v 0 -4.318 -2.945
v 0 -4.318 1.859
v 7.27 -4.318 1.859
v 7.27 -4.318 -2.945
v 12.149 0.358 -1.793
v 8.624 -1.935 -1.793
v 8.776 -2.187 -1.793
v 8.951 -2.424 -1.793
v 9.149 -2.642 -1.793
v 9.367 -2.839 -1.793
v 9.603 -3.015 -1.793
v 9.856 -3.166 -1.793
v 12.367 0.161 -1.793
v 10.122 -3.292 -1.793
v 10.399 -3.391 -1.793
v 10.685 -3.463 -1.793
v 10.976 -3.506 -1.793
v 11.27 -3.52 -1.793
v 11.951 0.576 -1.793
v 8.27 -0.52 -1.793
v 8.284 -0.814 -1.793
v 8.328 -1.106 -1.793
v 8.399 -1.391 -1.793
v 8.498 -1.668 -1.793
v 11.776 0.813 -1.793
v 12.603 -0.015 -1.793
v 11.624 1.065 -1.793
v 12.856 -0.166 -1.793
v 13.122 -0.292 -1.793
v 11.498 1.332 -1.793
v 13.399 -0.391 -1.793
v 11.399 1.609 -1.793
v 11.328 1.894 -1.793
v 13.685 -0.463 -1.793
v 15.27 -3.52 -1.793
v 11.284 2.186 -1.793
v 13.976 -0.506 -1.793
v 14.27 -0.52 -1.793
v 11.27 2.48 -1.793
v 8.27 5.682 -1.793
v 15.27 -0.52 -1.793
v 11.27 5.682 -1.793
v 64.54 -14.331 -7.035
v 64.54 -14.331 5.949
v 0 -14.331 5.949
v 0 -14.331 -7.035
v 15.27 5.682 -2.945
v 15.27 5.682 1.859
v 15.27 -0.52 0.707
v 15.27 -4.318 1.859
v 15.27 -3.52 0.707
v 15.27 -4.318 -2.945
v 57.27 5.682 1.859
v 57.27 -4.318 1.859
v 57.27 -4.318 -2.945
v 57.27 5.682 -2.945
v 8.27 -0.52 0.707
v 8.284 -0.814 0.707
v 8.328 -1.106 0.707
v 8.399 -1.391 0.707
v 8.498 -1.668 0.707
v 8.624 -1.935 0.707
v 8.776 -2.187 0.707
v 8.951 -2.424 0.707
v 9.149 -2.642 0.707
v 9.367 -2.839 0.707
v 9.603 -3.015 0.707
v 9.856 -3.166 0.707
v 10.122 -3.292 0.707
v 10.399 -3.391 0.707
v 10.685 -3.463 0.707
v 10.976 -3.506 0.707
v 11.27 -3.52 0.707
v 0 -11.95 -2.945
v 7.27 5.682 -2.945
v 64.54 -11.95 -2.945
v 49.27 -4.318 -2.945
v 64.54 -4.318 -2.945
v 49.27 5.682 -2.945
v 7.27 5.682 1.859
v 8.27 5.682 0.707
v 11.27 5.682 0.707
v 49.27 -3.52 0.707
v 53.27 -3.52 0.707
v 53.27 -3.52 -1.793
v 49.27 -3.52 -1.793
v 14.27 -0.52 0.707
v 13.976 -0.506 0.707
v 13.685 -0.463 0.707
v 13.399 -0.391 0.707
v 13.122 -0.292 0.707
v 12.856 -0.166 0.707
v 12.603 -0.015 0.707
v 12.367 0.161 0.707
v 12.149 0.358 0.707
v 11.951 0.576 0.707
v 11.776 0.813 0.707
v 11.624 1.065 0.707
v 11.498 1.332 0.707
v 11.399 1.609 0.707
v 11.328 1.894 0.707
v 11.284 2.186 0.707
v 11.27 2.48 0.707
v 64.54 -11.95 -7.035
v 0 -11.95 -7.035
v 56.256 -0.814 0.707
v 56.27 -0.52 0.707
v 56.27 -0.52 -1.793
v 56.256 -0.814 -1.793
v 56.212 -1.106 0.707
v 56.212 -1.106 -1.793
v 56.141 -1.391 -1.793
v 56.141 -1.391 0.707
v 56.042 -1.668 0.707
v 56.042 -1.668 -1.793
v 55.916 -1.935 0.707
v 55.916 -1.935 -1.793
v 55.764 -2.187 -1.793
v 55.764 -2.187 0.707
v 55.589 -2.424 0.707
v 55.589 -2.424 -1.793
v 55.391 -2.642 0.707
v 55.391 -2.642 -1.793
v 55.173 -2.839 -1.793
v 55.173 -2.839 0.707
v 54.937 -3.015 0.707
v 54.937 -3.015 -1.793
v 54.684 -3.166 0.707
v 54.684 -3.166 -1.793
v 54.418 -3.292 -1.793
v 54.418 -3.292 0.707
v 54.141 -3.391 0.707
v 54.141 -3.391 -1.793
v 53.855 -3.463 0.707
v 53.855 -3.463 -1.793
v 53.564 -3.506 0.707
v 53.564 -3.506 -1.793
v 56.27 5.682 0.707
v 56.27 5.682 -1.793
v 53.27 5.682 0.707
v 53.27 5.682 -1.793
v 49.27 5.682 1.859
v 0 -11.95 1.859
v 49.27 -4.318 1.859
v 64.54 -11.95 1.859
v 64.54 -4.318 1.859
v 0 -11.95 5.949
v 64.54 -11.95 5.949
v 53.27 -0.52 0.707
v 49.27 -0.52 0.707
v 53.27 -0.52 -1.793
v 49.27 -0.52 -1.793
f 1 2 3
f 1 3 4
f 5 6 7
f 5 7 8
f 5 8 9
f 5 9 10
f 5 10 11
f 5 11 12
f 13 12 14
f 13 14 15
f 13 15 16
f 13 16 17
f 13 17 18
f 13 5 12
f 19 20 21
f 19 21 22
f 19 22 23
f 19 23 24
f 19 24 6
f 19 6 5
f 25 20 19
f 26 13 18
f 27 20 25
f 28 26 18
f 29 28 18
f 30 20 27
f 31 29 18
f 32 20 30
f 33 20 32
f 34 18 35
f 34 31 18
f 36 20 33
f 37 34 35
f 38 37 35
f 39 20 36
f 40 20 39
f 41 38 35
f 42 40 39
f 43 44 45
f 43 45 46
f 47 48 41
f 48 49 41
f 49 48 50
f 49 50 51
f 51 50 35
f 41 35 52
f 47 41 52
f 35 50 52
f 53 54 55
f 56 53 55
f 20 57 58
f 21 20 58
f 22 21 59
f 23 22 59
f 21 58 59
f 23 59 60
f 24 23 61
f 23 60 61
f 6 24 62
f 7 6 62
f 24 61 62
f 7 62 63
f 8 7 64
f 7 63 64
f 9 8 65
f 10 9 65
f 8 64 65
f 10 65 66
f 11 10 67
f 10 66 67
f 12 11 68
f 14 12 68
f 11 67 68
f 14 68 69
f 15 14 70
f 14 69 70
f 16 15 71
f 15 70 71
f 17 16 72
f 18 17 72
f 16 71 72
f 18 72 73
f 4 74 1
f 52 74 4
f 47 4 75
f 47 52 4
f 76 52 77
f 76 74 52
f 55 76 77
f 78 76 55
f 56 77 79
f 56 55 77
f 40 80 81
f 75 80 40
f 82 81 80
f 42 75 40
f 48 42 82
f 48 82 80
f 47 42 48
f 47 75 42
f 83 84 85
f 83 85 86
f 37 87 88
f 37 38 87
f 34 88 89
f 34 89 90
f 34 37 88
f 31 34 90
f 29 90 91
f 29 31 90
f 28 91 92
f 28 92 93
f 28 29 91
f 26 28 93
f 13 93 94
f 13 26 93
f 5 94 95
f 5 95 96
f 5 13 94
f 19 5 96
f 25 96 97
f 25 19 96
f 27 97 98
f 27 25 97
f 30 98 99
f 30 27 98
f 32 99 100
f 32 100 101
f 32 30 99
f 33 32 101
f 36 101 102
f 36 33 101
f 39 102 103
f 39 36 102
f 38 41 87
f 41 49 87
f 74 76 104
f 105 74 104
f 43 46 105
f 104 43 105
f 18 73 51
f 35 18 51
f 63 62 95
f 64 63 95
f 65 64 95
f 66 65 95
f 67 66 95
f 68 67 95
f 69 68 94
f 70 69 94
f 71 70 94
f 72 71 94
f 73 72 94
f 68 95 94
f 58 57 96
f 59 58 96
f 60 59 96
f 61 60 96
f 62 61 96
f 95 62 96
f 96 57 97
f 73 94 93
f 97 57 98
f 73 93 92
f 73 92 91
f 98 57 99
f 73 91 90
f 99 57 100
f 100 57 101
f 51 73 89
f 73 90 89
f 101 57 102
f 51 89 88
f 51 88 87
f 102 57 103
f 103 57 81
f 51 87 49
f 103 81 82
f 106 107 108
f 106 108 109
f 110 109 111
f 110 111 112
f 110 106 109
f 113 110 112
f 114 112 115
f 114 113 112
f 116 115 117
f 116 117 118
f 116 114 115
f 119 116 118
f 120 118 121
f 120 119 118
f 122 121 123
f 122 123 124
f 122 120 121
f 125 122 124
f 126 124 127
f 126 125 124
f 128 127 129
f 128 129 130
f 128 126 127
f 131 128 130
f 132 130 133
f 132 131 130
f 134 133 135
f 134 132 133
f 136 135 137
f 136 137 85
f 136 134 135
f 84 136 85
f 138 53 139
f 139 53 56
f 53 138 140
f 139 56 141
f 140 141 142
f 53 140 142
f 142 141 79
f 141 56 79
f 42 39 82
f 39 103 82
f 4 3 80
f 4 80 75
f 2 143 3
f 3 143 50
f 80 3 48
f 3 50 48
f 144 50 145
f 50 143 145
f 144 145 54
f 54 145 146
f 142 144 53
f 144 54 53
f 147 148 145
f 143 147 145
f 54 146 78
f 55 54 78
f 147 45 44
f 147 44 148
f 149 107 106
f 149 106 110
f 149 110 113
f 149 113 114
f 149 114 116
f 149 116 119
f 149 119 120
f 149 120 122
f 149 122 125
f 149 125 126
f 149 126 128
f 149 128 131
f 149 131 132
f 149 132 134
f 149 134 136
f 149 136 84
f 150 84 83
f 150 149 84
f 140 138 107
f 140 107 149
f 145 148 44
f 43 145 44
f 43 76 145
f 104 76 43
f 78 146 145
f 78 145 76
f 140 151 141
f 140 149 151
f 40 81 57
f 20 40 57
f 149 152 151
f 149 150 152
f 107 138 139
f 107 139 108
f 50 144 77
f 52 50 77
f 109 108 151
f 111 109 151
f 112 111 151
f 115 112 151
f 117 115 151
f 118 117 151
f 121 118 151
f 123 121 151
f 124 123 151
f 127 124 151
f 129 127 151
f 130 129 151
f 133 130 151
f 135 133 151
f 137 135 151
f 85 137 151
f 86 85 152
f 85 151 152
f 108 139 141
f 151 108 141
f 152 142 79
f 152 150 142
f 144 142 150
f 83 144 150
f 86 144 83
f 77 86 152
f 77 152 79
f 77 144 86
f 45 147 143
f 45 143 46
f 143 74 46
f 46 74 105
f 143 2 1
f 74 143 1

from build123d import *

# Parameters (mm, degrees)
SKETCH3_W           = 12.984343194
SKETCH3_H           = 2.380771229
SKETCH3_W_2         = 4.803091943
SKETCH3_H_2         = 9.313818956
BOSS_EXTRUDE2_DEPTH = 32.27
SKETCH6_W           = 8
SKETCH6_H           = 4.803091943
BOSS_EXTRUDE3_DEPTH = 10
CUT_EXTRUDE2_DEPTH  = 1.25
FILLET1_R           = 3


with BuildPart() as part:
    # Sketch3 → Boss-Extrude2 (new body)
    with BuildSketch(Plane(origin=(0, 0, 0), x_dir=(0, 0, -1), z_dir=(1, 0, 0))):
        with Locations((0.543022473, -13.14020457)):
            Rectangle(SKETCH3_W, SKETCH3_H)
        with Locations((0.543022474, -8.974909478)):
            Rectangle(SKETCH3_W_2, SKETCH3_H_2)
    boss_extrude2 = extrude(amount=BOSS_EXTRUDE2_DEPTH)

    # Sketch6 → Boss-Extrude3 (add)
    with BuildSketch(Plane(origin=(0, -4.318, 0), x_dir=(1, 0, 0), z_dir=(0, 1, 0))):
        with Locations((11.27, 0.543022474)):
            Rectangle(SKETCH6_W, SKETCH6_H)
    boss_extrude3 = extrude(amount=BOSS_EXTRUDE3_DEPTH)

    # Sketch7 → Cut-Extrude2 (cut, symmetric)
    with BuildSketch(Plane.XY.offset(-0.543022473)):
        with BuildLine():
            Line((11.27, 5.682), (8.27, 5.682))
            Line((8.27, 5.682), (8.27, -0.520355546))
            ThreePointArc((8.27, -0.520355546), (9.148679656, -2.64167589), (11.27, -3.520355546))
            Line((11.27, -3.520355546), (15.27, -3.520355546))
            Line((15.27, -3.520355546), (15.27, -0.520355546))
            Line((15.27, -0.520355546), (11.27, -0.520355546))
            Line((11.27, -0.520355546), (11.27, 5.682))
        make_face()
    cut_extrude2 = extrude(amount=CUT_EXTRUDE2_DEPTH, both=True, mode=Mode.SUBTRACT)

    # Fillet1
    fillet1_edges = [part.edges().sort_by_distance(p)[0] for p in [
        (11.27, -0.520355546, -0.543022473),
    ]]
    fillet(fillet1_edges, radius=FILLET1_R)

    # Mirror2: Boss-Extrude2, Boss-Extrude3, Cut-Extrude2 across plane
    add(boss_extrude2.mirror(Plane.ZY.offset(-32.27)))
    add(boss_extrude3.mirror(Plane.ZY.offset(-32.27)))
    add(cut_extrude2.mirror(Plane.ZY.offset(-32.27)), mode=Mode.SUBTRACT)


solid = part.part
